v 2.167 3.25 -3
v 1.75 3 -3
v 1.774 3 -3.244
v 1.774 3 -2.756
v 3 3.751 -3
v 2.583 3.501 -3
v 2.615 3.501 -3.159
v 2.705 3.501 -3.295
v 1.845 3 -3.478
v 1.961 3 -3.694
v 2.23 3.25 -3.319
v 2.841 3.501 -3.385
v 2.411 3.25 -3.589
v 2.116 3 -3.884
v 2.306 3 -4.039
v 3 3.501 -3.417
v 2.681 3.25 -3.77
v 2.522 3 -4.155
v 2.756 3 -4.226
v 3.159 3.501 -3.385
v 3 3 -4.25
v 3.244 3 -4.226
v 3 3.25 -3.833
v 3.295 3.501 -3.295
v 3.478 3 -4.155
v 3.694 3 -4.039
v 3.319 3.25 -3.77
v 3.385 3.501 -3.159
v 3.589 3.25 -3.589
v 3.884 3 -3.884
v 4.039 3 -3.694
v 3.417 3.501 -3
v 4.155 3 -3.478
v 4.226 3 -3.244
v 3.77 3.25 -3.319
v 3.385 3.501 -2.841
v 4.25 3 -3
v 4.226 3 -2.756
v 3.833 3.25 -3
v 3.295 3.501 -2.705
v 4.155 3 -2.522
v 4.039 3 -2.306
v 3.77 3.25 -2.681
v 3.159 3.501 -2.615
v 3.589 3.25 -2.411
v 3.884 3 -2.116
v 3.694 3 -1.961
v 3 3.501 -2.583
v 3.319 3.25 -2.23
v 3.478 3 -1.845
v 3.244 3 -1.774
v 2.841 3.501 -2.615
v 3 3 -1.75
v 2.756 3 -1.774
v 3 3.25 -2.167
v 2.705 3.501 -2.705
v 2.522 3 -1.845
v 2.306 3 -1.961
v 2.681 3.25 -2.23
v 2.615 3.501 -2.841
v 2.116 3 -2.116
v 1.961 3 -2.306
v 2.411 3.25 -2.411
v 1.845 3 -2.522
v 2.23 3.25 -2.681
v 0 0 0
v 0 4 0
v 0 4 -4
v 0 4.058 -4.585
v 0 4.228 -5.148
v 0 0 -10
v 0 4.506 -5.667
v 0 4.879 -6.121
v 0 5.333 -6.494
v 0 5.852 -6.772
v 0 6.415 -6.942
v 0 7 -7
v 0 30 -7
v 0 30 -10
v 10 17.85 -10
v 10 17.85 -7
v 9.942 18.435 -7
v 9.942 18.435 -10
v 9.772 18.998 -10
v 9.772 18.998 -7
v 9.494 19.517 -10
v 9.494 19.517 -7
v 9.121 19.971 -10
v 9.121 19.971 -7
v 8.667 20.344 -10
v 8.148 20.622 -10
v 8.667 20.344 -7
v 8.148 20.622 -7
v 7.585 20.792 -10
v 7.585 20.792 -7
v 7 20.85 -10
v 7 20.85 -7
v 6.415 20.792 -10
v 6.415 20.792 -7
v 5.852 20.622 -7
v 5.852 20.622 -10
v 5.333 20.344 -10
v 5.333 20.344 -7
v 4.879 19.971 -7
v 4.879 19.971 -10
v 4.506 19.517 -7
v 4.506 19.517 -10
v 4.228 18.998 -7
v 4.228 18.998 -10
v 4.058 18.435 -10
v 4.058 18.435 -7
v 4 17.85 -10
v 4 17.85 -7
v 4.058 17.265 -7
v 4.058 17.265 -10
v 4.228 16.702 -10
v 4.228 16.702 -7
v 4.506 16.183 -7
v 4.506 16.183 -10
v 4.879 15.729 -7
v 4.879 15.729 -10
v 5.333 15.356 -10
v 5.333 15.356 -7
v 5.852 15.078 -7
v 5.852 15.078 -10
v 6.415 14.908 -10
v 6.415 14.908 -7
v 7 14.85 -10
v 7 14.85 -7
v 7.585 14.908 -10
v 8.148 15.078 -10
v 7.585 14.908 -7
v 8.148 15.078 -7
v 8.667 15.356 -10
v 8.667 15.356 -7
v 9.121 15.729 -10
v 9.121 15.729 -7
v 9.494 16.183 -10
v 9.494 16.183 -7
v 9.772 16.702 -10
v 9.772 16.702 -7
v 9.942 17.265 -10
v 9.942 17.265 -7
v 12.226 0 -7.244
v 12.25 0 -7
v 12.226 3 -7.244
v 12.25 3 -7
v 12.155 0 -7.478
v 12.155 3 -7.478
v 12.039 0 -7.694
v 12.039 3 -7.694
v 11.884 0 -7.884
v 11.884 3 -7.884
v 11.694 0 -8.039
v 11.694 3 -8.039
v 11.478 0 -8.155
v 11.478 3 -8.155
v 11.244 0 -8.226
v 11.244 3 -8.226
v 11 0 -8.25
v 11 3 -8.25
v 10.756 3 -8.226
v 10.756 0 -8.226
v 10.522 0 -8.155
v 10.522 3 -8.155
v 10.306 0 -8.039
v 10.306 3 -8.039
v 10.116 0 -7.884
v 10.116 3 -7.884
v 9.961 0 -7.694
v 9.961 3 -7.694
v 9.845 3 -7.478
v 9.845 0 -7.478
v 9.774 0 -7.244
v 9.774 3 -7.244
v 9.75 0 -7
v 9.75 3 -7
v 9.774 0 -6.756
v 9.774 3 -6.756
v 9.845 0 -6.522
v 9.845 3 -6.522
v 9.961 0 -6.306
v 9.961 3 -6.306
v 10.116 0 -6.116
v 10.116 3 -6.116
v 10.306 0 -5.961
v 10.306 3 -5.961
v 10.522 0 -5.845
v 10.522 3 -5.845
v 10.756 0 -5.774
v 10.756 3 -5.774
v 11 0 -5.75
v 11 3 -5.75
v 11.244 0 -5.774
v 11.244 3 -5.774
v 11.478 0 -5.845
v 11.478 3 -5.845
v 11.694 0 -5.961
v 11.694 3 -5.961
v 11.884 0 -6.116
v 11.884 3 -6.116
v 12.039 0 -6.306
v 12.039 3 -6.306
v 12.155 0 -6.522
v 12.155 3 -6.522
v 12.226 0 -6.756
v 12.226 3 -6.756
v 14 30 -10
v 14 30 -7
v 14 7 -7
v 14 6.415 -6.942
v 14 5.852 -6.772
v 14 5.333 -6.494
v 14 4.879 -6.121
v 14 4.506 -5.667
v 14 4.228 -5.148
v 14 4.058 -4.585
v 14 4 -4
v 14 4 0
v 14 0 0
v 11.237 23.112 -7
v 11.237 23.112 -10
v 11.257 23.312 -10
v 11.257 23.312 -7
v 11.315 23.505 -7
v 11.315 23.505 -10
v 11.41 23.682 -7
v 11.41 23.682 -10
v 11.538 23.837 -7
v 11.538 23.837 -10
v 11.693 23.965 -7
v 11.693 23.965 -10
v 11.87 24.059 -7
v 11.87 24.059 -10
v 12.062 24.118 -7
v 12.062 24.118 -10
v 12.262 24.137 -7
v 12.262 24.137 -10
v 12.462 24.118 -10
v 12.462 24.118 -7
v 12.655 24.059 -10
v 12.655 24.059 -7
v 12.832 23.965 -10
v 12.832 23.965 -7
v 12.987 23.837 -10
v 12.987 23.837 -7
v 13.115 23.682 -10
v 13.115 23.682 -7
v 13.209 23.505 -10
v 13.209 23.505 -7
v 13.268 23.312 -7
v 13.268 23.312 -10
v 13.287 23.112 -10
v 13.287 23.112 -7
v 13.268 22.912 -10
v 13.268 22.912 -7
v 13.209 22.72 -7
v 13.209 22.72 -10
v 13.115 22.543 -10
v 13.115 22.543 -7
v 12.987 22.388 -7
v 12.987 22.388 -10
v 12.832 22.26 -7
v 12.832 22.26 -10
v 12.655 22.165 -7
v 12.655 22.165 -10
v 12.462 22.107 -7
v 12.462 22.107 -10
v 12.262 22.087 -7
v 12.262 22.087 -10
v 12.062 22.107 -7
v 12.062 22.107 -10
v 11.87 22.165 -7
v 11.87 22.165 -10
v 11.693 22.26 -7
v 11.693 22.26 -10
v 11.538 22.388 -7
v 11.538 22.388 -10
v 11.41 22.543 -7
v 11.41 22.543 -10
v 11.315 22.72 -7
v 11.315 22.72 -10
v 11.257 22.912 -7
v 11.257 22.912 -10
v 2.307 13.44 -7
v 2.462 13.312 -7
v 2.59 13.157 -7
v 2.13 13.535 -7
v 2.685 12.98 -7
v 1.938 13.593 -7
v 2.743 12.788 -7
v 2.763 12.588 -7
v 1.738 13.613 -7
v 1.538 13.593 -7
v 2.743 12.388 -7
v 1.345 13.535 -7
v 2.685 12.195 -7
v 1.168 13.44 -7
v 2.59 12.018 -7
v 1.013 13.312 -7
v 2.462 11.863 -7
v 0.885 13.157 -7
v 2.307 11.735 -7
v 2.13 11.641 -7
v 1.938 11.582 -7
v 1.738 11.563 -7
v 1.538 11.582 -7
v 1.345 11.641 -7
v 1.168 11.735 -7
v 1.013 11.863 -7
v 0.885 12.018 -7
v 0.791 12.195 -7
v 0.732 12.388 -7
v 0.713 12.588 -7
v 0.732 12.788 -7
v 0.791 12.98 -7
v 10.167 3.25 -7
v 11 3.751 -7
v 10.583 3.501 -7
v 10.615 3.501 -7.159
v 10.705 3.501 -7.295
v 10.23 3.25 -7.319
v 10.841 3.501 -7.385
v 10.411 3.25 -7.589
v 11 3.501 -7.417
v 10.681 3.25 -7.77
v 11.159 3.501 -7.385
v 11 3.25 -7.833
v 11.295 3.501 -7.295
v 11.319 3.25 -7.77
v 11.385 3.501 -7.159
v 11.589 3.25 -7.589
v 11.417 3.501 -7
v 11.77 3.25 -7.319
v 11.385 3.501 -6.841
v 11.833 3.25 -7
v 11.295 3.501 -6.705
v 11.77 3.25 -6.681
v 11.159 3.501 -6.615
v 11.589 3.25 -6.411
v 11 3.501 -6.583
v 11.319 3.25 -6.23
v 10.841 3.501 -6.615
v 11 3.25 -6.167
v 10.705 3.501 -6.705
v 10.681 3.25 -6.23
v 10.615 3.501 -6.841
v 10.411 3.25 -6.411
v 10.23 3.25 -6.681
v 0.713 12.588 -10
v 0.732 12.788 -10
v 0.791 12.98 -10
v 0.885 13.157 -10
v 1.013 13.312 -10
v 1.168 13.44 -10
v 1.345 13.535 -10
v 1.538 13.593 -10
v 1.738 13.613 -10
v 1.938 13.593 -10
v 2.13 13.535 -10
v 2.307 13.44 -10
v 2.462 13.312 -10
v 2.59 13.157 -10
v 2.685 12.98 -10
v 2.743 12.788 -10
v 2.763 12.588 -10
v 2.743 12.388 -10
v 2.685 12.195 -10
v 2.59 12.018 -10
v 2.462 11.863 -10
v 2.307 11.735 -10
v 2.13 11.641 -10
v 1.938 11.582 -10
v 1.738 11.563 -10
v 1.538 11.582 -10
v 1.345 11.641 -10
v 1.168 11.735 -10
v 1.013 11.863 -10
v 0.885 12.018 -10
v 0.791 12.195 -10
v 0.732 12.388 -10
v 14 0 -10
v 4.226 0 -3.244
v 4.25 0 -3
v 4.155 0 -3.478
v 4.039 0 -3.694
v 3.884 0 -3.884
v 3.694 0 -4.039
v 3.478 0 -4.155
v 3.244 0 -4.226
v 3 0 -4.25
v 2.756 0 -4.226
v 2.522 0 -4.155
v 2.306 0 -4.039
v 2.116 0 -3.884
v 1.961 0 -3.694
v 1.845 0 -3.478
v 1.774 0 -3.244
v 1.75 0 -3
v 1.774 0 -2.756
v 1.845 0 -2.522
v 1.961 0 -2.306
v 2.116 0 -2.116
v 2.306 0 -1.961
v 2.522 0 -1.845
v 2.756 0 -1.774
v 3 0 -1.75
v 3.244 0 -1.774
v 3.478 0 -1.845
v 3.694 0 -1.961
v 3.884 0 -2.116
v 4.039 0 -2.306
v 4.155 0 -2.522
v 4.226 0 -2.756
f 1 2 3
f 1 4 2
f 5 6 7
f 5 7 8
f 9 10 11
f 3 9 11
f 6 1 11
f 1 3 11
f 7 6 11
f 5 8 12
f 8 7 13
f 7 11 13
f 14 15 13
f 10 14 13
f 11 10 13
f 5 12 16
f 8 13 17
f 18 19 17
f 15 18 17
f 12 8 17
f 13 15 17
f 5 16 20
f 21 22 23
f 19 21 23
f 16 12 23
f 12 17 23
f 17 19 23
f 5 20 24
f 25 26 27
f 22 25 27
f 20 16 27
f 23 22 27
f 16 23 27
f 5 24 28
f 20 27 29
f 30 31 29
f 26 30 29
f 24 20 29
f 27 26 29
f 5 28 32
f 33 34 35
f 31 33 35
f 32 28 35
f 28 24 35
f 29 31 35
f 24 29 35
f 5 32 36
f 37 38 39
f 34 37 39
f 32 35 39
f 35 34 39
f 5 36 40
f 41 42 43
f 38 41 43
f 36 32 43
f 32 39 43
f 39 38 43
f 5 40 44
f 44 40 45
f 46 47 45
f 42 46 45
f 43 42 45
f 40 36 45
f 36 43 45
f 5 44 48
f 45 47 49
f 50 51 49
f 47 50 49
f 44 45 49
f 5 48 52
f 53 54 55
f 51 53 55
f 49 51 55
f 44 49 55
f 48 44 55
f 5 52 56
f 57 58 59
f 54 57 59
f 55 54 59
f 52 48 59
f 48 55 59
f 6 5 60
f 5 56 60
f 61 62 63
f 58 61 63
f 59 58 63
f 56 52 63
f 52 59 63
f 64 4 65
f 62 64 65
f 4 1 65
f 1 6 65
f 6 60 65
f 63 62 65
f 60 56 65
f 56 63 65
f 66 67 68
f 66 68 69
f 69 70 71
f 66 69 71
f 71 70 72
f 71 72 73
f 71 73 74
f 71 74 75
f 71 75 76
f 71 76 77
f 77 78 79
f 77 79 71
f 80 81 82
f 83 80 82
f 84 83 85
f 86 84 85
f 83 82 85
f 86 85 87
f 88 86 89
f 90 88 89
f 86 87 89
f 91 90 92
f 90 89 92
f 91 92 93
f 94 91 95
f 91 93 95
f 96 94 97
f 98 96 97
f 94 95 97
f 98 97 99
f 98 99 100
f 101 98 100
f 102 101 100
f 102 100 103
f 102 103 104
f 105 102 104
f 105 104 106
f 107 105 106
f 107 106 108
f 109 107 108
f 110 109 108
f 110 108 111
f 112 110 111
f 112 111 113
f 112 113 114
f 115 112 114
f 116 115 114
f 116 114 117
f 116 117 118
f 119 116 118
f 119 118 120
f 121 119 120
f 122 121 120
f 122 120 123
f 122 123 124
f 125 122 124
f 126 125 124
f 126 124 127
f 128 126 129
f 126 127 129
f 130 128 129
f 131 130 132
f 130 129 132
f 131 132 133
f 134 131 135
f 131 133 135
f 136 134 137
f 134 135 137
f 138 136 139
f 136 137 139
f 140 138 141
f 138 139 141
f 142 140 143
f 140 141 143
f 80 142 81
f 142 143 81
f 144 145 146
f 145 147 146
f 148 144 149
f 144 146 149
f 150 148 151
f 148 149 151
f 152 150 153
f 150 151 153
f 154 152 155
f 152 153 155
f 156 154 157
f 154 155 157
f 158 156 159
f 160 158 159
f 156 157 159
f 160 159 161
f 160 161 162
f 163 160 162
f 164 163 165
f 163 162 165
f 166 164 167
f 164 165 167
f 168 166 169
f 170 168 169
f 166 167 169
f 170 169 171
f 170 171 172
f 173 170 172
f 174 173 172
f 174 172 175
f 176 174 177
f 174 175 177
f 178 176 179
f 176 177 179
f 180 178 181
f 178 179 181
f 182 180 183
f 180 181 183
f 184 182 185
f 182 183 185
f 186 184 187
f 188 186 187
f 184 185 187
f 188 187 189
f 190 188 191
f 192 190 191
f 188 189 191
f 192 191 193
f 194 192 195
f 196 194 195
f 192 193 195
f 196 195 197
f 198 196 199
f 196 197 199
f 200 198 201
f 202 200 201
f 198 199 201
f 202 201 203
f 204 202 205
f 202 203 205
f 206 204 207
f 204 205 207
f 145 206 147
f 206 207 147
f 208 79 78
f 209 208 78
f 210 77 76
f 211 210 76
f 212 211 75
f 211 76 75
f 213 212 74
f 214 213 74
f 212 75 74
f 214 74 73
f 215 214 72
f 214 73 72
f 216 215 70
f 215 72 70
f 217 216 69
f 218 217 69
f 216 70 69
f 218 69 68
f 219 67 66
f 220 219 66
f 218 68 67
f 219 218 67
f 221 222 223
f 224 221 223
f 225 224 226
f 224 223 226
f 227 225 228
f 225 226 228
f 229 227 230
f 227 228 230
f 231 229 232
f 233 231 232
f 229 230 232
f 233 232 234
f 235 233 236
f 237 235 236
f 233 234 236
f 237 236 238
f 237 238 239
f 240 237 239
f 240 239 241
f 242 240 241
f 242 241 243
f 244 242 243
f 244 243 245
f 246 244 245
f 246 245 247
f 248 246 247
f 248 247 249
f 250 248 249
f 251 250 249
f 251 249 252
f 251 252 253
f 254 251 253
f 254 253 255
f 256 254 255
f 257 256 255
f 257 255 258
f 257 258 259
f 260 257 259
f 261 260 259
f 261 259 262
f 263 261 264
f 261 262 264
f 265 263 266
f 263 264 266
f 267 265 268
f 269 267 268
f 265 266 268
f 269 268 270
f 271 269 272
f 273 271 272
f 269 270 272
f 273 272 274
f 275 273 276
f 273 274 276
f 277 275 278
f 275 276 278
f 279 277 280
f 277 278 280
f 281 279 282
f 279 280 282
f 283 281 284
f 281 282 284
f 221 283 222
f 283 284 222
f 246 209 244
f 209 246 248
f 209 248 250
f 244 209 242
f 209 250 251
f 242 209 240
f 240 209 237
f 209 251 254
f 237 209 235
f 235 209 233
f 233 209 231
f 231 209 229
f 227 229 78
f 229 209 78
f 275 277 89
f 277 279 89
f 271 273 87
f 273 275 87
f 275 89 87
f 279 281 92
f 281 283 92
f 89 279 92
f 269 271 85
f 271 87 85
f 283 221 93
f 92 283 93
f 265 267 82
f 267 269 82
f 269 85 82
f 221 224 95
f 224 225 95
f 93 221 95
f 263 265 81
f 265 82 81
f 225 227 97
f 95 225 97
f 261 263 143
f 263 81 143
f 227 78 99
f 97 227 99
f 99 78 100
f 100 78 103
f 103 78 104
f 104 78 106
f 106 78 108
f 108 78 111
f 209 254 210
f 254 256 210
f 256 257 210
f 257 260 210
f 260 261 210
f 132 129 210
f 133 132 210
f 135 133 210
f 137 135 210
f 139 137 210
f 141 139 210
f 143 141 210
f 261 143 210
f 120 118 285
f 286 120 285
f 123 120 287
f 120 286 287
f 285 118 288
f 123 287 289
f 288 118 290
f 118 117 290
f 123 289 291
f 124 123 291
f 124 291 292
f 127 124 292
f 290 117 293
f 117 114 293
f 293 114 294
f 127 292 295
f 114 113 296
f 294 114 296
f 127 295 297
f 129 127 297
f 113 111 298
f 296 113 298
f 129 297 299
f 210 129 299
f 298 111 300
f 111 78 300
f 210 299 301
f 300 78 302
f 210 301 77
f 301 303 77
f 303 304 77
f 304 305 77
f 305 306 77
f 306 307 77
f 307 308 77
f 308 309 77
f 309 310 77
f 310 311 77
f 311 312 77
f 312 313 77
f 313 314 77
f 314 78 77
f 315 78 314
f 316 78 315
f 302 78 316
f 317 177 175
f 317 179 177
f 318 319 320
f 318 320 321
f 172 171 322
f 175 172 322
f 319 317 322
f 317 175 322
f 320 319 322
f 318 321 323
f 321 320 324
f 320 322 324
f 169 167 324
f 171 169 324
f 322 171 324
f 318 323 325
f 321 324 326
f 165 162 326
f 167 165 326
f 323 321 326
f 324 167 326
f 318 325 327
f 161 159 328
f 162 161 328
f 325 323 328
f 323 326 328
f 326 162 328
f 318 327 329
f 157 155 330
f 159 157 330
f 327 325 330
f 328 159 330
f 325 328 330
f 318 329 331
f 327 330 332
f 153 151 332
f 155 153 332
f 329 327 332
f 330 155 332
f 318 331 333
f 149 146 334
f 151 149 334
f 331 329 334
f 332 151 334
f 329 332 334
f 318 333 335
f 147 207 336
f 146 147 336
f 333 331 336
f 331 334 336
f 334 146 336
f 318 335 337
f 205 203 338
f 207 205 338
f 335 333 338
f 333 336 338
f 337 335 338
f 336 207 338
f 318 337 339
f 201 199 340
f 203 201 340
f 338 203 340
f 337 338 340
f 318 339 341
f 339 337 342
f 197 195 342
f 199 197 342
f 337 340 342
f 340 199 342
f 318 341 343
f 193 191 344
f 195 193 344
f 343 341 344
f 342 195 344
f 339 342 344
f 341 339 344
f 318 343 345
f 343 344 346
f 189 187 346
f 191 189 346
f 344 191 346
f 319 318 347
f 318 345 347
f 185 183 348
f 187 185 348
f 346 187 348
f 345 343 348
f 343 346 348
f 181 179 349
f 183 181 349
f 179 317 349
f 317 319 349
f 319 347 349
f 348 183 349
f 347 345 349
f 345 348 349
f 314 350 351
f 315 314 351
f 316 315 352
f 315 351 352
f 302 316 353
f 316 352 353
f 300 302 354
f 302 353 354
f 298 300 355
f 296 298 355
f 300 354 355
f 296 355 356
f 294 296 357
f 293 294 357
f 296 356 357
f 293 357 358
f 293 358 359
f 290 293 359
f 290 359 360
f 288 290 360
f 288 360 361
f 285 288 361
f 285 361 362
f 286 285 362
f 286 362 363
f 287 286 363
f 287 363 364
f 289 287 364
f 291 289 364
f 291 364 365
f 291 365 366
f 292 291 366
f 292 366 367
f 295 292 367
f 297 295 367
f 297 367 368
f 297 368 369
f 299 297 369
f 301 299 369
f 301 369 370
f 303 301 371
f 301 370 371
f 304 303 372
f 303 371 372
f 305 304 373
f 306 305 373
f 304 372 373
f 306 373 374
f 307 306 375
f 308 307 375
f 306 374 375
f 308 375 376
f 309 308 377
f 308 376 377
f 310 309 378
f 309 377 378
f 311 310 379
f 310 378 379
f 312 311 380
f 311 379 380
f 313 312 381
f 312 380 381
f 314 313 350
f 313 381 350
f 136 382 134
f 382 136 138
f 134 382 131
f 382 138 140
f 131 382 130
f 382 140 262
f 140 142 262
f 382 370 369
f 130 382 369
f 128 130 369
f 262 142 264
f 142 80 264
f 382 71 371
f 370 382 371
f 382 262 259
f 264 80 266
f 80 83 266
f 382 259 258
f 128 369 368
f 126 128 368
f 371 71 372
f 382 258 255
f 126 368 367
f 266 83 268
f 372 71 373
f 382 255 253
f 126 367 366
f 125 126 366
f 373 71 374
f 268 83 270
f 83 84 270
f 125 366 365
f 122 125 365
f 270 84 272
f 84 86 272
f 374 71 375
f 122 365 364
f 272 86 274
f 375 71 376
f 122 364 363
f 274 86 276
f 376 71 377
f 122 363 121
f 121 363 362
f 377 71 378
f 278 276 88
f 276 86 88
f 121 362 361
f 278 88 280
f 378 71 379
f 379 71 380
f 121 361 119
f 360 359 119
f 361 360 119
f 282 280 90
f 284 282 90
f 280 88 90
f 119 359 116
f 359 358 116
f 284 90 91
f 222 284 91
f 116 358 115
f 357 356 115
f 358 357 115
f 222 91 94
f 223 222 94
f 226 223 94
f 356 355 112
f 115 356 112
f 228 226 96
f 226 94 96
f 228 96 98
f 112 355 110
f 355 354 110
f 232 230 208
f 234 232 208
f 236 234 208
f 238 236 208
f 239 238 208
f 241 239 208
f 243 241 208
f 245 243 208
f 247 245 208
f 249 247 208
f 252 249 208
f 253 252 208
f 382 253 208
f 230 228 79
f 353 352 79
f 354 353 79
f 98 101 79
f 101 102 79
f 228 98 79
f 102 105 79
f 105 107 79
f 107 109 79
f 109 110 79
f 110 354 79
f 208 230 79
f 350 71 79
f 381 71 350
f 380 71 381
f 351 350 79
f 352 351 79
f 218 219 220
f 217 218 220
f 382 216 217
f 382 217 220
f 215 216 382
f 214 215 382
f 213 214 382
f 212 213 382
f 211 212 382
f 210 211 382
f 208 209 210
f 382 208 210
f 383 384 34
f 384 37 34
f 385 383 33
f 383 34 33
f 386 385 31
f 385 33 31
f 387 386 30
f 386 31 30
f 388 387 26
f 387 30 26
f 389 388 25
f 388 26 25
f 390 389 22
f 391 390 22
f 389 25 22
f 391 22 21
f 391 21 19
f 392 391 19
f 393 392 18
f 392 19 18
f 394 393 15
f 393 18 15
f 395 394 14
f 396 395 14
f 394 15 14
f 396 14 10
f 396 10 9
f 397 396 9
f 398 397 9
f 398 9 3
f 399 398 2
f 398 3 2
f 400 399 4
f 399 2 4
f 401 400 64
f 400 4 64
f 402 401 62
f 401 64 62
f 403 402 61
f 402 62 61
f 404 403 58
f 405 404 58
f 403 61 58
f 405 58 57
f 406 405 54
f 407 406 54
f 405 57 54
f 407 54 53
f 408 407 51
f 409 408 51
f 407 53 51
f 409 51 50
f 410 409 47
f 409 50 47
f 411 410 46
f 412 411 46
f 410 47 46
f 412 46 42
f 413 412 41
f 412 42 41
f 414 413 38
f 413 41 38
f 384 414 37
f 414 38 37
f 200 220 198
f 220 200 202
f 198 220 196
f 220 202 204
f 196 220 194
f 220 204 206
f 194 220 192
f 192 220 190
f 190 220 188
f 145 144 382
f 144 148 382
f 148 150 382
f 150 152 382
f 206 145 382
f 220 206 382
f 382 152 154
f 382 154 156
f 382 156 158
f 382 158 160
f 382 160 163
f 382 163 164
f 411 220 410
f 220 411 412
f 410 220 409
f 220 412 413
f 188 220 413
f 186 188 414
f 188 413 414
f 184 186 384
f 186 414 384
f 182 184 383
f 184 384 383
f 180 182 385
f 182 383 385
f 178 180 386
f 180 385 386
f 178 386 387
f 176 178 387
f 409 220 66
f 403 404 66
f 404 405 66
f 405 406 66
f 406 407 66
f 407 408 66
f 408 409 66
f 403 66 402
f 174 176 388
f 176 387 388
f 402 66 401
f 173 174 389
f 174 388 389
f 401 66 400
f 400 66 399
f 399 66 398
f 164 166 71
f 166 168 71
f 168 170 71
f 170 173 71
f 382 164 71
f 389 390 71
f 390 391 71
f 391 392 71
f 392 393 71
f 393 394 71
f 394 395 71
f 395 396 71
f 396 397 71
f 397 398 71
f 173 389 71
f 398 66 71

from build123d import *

# Parameters (mm, degrees)
BOSS_EXTRUDE1_DEPTH                = 14
TAP_DRILL_FOR_M3X0_5_TAP1_D        = 2.5
TAP_DRILL_FOR_M3X0_5_TAP1_DEPTH    = 3
TAP_DRILL_FOR_M3X0_5_TAP1_TIP      = 0.751075774
CUT_EXTRUDE1_REACH                 = 5
SKETCH4_R                          = 3
TAP_DRILL_FOR_M2_5X0_45_TAP1_D     = 2.05
TAP_DRILL_FOR_M2_5X0_45_TAP1_DEPTH = 3


with BuildPart() as part:
    # Sketch1 → Boss-Extrude1 (new body)
    with BuildSketch(Plane(origin=(0, 0, 0), x_dir=(0, 0, -1), z_dir=(1, 0, 0))):
        with BuildLine():
            Line((0, 0), (10, 0))
            Line((10, 0), (10, 30))
            Line((10, 30), (7, 30))
            Line((7, 30), (7, 7))
            ThreePointArc((7, 7), (6.121320344, 4.878679656), (4, 4))
            Line((4, 4), (0, 4))
            Line((0, 4), (0, 0))
        make_face()
    extrude(amount=BOSS_EXTRUDE1_DEPTH)

    # Tap Drill for M3x0.5 Tap1
    with Locations(Plane(origin=(0, 0, 0), x_dir=(-1, 0, 0), z_dir=(0, -1, 0))):
        with Locations((-11, 7), (-3, 3)):
            Hole(TAP_DRILL_FOR_M3X0_5_TAP1_D / 2, depth=TAP_DRILL_FOR_M3X0_5_TAP1_DEPTH)
            with Locations((0, 0, -(TAP_DRILL_FOR_M3X0_5_TAP1_DEPTH + TAP_DRILL_FOR_M3X0_5_TAP1_TIP / 2))):  # 118° drill point
                Cone(0, TAP_DRILL_FOR_M3X0_5_TAP1_D / 2, TAP_DRILL_FOR_M3X0_5_TAP1_TIP, mode=Mode.SUBTRACT)

    # Sketch4 → Cut-Extrude1 (cut, up to next)
    with BuildSketch(Plane.XY.offset(-7), mode=Mode.PRIVATE) as cut_extrude1_sk1:
        with Locations((7, 17.85)):
            Circle(SKETCH4_R)
    cut_extrude1_tool1 = extrude(cut_extrude1_sk1.sketch, amount=-CUT_EXTRUDE1_REACH, mode=Mode.PRIVATE) & part.part
    add(cut_extrude1_tool1.solids().sort_by_distance((7, 17.85, -7))[0], mode=Mode.SUBTRACT)

    # Tap Drill for M2.5x0.45 Tap1
    with Locations(Plane.XY.offset(-7)):
        with Locations((1.737569913, 12.587569913), (12.262430087, 23.112430087)):
            Hole(TAP_DRILL_FOR_M2_5X0_45_TAP1_D / 2, depth=TAP_DRILL_FOR_M2_5X0_45_TAP1_DEPTH)


solid = part.part
